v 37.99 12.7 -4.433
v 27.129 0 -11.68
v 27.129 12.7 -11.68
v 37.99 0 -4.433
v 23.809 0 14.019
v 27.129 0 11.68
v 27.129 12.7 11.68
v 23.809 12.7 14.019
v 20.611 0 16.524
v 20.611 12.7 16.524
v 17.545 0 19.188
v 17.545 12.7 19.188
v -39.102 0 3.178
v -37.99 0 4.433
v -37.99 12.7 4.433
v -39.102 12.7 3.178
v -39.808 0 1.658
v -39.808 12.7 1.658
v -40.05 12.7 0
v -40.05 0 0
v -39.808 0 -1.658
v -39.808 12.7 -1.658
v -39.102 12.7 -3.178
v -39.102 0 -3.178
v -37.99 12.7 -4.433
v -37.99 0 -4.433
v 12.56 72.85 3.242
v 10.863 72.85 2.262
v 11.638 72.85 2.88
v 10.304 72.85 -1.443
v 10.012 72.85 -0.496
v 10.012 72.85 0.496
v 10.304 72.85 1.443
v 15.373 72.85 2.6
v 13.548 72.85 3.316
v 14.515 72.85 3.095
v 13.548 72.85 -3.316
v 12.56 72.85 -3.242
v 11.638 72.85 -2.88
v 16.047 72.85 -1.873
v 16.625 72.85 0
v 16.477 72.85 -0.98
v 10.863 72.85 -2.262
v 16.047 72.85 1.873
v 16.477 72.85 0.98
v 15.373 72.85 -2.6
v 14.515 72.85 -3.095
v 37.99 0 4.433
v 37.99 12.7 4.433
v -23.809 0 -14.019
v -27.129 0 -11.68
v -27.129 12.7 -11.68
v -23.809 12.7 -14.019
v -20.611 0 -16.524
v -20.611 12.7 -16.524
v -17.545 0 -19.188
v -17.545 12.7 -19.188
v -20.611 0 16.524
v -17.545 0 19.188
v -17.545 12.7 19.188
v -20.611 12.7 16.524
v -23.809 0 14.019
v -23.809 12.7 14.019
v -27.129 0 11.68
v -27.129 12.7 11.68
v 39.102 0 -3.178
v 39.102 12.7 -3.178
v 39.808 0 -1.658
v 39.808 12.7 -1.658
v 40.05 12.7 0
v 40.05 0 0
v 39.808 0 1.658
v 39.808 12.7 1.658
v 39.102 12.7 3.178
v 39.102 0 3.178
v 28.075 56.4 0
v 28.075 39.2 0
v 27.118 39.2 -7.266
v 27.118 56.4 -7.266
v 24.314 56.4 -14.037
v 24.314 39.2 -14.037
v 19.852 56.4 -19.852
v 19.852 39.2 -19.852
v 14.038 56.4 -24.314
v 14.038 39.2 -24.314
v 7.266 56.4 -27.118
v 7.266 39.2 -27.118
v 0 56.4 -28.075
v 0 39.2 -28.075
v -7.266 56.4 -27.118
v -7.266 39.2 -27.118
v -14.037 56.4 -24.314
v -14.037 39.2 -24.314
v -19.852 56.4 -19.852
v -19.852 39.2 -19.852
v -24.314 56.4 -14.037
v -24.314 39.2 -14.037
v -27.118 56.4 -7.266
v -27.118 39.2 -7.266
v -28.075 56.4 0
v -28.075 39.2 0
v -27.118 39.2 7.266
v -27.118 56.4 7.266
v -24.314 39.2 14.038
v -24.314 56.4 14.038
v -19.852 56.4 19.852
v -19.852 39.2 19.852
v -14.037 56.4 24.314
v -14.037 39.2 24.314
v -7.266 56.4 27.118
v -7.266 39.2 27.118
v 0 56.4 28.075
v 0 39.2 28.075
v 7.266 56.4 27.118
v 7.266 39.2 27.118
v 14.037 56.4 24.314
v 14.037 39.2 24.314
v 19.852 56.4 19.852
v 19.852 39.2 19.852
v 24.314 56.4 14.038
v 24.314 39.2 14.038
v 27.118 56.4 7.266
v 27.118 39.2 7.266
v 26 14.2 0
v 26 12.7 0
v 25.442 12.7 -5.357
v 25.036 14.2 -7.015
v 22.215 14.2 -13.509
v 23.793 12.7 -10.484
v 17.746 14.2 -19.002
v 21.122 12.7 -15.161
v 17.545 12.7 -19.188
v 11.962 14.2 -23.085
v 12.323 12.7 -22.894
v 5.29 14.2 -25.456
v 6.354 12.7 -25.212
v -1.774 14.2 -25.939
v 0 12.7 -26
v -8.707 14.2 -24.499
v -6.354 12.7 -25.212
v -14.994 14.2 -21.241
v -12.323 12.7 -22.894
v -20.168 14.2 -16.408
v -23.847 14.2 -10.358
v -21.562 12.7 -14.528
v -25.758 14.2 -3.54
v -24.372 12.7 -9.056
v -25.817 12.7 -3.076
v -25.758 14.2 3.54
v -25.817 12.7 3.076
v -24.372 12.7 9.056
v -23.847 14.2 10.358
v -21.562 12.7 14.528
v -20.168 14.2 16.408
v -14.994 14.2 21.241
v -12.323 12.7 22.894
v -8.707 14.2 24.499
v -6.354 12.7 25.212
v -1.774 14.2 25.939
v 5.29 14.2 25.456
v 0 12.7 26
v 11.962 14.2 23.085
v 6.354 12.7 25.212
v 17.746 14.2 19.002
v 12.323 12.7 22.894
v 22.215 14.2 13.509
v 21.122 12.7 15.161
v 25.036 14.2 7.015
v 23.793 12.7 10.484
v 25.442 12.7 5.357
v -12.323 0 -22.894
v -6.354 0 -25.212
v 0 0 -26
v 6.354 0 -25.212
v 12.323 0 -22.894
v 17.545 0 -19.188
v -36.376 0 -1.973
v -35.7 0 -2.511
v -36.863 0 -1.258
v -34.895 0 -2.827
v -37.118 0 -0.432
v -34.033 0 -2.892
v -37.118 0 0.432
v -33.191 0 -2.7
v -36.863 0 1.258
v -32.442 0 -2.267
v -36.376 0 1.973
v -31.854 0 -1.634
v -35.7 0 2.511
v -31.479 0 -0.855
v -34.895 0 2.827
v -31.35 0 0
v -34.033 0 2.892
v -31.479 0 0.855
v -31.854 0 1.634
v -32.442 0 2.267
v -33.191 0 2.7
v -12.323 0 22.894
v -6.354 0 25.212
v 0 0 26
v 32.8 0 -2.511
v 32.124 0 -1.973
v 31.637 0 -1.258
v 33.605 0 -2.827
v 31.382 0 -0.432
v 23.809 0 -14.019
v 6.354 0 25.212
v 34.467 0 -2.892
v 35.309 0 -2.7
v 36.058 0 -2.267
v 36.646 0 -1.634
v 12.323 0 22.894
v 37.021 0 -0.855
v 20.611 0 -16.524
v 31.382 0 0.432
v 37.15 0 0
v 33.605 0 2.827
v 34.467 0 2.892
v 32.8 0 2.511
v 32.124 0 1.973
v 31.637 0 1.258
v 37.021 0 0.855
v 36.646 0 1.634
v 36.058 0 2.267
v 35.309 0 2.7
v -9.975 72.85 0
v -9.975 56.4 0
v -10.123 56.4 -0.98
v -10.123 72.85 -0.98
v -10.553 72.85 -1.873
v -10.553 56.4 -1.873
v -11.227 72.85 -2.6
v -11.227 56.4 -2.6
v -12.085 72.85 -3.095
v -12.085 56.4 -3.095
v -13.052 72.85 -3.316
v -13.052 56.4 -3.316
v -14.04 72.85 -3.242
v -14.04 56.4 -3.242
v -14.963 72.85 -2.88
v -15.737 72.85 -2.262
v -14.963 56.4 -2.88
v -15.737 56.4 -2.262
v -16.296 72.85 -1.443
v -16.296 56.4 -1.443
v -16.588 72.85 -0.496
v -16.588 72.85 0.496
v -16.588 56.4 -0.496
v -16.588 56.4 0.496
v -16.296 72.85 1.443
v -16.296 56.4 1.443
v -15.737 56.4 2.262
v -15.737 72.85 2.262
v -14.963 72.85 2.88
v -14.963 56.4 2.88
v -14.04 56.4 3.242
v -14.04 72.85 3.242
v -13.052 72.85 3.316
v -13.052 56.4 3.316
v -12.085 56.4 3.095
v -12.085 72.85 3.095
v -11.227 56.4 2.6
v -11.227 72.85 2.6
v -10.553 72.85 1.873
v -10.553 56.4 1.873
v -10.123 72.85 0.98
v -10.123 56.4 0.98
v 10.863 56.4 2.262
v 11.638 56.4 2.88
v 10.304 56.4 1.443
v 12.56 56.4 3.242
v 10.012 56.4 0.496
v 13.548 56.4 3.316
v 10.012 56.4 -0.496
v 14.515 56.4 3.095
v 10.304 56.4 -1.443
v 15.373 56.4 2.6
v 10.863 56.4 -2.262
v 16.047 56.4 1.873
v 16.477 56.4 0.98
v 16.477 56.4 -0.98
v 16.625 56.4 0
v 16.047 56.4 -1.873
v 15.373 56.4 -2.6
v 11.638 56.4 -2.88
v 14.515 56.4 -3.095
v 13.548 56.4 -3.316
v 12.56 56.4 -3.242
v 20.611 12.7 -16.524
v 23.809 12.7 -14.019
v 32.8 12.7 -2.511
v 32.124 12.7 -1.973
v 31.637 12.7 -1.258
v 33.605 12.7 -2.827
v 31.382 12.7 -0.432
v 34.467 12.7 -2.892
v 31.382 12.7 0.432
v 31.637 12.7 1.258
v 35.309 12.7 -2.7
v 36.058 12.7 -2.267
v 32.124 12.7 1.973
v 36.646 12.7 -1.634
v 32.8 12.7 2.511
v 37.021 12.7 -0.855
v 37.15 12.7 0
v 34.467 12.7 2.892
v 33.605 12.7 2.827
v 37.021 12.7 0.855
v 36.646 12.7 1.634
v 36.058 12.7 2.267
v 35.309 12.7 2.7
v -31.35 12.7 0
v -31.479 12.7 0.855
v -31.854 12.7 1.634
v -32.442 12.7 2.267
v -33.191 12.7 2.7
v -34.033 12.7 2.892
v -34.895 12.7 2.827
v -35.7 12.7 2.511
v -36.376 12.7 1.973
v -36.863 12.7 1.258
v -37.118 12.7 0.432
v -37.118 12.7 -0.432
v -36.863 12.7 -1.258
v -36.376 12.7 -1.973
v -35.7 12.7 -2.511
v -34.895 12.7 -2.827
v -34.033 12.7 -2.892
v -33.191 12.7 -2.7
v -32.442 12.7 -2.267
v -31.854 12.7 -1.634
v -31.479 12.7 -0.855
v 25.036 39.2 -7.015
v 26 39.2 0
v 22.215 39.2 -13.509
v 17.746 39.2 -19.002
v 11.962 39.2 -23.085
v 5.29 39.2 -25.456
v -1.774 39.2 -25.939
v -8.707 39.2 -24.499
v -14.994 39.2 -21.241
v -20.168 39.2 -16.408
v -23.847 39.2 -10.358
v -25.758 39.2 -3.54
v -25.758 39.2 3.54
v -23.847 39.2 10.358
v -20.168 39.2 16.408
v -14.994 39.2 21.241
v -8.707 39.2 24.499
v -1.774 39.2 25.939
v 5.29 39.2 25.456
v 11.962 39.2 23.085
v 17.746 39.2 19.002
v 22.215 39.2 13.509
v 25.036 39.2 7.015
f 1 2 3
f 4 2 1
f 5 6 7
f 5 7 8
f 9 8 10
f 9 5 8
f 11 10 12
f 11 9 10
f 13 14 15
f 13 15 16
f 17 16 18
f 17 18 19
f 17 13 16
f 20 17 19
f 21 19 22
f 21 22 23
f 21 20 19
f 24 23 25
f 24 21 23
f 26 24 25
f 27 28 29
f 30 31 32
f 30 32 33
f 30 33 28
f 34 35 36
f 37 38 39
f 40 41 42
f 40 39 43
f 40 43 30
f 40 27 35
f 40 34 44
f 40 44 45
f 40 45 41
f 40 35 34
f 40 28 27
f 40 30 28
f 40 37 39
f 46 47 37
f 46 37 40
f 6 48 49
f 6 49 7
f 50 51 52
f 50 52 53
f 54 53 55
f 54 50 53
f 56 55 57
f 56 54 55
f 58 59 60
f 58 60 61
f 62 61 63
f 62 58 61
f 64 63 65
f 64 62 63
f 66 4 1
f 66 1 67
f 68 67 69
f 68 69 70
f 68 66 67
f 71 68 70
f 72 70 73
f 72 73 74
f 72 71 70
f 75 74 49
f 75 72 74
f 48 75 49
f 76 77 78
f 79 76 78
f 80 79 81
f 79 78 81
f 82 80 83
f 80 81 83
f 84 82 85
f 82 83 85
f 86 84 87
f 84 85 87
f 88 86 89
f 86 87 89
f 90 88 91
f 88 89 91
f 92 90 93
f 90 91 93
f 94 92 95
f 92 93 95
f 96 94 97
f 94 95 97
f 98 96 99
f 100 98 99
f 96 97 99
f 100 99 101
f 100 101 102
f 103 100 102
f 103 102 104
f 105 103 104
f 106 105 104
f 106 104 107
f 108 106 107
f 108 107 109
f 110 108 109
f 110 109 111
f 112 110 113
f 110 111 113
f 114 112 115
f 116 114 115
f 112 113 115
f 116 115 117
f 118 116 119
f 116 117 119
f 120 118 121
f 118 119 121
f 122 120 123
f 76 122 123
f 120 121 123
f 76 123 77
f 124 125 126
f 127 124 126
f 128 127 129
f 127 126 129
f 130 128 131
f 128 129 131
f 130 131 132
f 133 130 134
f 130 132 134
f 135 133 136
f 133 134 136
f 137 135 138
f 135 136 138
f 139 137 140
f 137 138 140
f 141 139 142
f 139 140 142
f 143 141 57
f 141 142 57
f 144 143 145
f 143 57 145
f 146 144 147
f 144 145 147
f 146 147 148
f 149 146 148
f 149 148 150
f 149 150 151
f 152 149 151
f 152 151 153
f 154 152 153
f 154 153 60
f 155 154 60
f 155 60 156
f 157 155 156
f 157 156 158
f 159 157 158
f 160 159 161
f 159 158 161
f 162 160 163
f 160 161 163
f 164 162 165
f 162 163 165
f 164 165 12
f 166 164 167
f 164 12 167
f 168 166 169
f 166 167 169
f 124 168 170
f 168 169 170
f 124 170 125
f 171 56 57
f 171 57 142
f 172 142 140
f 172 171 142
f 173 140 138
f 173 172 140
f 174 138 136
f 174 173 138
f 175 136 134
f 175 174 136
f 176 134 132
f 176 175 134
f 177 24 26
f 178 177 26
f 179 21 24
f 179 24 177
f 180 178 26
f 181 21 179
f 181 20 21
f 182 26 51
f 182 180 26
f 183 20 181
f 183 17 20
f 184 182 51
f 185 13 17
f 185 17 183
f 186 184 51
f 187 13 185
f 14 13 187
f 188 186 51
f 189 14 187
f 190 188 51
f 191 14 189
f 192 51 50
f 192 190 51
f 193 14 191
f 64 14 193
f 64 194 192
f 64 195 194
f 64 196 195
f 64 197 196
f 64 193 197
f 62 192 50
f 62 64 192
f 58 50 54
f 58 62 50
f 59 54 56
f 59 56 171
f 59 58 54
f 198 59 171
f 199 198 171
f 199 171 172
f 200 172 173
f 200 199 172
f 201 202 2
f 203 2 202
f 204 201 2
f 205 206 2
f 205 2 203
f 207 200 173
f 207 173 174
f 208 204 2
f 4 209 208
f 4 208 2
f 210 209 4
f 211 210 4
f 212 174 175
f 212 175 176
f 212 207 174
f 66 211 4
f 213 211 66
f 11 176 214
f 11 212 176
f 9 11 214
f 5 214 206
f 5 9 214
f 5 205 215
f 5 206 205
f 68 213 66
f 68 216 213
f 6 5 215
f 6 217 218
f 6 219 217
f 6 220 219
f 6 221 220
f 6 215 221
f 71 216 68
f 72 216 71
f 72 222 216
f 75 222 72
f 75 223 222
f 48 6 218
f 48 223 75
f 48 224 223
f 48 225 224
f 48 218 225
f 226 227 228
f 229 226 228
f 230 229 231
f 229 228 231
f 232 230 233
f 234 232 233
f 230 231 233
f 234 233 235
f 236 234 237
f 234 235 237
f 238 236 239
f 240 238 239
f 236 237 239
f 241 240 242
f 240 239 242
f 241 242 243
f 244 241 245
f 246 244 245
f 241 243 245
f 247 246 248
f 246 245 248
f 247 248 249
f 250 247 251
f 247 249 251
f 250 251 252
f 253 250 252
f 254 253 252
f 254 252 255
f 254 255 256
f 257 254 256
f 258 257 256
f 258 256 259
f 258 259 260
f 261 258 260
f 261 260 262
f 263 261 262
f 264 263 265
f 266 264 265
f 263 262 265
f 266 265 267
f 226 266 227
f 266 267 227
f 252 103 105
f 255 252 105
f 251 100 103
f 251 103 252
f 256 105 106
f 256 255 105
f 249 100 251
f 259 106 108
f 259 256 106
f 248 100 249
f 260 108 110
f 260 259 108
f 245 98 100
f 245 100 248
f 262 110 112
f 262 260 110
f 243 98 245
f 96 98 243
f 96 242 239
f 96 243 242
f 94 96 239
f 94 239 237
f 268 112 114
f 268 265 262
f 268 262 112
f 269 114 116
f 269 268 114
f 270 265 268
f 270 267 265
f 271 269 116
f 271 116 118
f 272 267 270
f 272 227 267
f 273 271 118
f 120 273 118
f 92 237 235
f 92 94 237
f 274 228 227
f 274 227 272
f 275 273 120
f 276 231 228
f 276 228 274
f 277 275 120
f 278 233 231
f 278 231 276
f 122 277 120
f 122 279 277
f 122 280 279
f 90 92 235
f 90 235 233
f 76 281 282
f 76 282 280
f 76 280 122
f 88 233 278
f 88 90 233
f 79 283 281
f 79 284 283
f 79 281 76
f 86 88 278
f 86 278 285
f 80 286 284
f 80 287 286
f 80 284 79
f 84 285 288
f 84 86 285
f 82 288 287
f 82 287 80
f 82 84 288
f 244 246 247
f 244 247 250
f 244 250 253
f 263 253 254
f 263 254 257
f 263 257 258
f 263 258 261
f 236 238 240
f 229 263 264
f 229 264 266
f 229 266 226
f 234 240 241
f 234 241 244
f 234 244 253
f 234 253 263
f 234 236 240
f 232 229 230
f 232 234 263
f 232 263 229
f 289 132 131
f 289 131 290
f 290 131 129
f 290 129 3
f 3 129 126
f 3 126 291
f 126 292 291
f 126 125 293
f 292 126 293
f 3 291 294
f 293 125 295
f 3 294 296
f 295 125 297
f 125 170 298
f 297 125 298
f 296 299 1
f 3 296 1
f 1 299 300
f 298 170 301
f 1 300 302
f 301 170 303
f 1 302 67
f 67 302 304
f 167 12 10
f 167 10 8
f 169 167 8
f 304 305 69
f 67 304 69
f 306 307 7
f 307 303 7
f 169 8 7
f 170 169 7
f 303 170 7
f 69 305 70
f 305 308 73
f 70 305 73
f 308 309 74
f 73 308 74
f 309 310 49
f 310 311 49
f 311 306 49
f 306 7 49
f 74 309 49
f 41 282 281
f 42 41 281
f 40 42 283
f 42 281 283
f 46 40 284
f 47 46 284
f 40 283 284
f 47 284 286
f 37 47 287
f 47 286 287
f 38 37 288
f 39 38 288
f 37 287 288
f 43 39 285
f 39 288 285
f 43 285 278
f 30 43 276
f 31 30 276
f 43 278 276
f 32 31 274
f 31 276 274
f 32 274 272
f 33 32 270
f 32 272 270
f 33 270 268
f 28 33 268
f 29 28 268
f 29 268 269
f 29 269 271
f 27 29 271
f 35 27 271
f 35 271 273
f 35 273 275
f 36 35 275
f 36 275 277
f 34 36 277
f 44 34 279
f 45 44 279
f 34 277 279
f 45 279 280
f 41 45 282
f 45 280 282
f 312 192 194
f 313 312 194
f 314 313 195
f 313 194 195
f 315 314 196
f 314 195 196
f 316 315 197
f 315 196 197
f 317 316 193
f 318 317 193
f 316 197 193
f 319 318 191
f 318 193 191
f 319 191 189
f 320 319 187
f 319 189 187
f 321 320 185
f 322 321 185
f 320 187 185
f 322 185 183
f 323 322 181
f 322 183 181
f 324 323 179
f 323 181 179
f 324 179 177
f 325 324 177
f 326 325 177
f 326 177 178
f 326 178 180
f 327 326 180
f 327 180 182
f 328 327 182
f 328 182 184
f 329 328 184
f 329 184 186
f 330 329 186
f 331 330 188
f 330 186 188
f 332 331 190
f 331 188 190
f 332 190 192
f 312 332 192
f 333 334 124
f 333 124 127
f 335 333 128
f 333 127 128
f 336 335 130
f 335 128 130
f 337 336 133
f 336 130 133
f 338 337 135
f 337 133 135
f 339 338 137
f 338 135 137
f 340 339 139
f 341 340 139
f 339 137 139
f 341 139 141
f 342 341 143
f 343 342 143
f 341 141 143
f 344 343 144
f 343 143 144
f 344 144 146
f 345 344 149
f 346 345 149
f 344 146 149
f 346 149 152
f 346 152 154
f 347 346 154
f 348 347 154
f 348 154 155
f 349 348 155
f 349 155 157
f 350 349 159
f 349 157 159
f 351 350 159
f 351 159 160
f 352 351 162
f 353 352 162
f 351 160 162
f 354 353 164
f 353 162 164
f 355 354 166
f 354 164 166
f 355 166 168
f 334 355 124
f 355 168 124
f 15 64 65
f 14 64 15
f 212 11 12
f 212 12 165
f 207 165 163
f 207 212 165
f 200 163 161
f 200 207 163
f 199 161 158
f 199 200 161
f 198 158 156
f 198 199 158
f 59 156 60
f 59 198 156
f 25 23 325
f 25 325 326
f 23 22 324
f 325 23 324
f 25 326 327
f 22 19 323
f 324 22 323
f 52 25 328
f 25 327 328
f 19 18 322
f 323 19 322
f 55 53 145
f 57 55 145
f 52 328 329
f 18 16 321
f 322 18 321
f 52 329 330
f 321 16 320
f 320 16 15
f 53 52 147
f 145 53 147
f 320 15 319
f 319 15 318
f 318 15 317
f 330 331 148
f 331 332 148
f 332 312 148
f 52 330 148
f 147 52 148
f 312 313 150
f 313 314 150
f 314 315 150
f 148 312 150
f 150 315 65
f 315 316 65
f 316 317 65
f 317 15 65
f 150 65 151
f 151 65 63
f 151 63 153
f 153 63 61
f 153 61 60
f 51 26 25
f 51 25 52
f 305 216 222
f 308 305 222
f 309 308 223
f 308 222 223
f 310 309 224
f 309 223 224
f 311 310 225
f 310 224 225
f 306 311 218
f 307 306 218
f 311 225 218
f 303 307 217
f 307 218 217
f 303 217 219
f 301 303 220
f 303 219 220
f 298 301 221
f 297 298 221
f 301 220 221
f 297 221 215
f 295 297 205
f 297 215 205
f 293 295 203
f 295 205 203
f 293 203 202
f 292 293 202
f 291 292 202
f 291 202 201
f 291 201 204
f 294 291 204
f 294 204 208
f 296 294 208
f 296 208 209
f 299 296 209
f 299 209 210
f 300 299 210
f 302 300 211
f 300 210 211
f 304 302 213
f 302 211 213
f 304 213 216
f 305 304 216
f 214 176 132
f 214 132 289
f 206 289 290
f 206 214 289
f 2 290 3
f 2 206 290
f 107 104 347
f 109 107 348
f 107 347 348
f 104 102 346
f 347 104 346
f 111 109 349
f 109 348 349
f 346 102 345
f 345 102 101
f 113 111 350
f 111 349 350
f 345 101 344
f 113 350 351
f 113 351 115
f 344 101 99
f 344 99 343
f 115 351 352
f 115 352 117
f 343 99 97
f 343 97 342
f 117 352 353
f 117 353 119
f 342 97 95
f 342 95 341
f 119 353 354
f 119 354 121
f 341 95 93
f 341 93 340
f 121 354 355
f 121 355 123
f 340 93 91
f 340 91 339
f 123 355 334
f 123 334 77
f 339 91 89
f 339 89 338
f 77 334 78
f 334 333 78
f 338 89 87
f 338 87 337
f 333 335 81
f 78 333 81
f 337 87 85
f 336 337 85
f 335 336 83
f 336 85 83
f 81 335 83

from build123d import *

# Parameters (mm, degrees)
SKETCH1_R           = 26
BOSS_EXTRUDE1_DEPTH = 14.2
SKETCH4_R           = 2.9
BOSS_EXTRUDE2_DEPTH = 12.7
SKETCH8_R           = 26
BOSS_EXTRUDE3_DEPTH = 25
SKETCH9_R           = 28.075
BOSS_EXTRUDE4_DEPTH = 17.2
SKETCH10_R          = 3.325
BOSS_EXTRUDE5_DEPTH = 16.45


with BuildPart() as part:
    # Sketch1 → Boss-Extrude1 (new body)
    with BuildSketch(Plane(origin=(0, 0, 0), x_dir=(1, 0, 0), z_dir=(0, 1, 0))):
        Circle(SKETCH1_R)
    extrude(amount=BOSS_EXTRUDE1_DEPTH)

    # Sketch4 → Boss-Extrude2 (add)
    with BuildSketch(Plane.XZ):
        with BuildLine():
            Line((27.12908409, -11.679561866), (37.990088974, -4.433027686))
            ThreePointArc((37.990088974, -4.433027686), (40.05, 0), (37.990088974, 4.433027686))
            Line((37.990088974, 4.433027686), (27.12908409, 11.679561866))
            ThreePointArc((27.12908409, 11.679561866), (22.194049101, 15.251075575), (17.545087541, 19.18775399))
            ThreePointArc((17.545087541, 19.18775399), (0, 26), (-17.545087541, 19.18775399))
            ThreePointArc((-17.545087541, 19.18775399), (-22.194049101, 15.251075575), (-27.12908409, 11.679561866))
            Line((-27.12908409, 11.679561866), (-37.990088974, 4.433027686))
            ThreePointArc((-37.990088974, 4.433027686), (-40.05, 0), (-37.990088974, -4.433027686))
            Line((-37.990088974, -4.433027686), (-27.12908409, -11.679561866))
            ThreePointArc((-27.12908409, -11.679561866), (-22.194049101, -15.251075575), (-17.545087541, -19.18775399))
            ThreePointArc((-17.545087541, -19.18775399), (0, -26), (17.545087541, -19.18775399))
            ThreePointArc((17.545087541, -19.18775399), (22.194049101, -15.251075575), (27.12908409, -11.679561866))
        make_face()
        with Locations((34.25, 0)):
            Circle(SKETCH4_R, mode=Mode.SUBTRACT)
        with Locations((-34.25, 0)):
            Circle(SKETCH4_R, mode=Mode.SUBTRACT)
    extrude(amount=-BOSS_EXTRUDE2_DEPTH)

    # Sketch8 → Boss-Extrude3 (add)
    with BuildSketch(Plane(origin=(0, 14.2, 0), x_dir=(1, 0, 0), z_dir=(0, 1, 0))):
        Circle(SKETCH8_R)
    extrude(amount=BOSS_EXTRUDE3_DEPTH)

    # Sketch9 → Boss-Extrude4 (add)
    with BuildSketch(Plane(origin=(0, 39.2, 0), x_dir=(1, 0, 0), z_dir=(0, 1, 0))):
        Circle(SKETCH9_R)
    extrude(amount=BOSS_EXTRUDE4_DEPTH)

    # Sketch10 → Boss-Extrude5 (add)
    with BuildSketch(Plane(origin=(0, 56.4, 0), x_dir=(1, 0, 0), z_dir=(0, 1, 0))):
        with Locations((13.3, 0)):
            Circle(SKETCH10_R)
        with Locations((-13.3, 0)):
            Circle(SKETCH10_R)
    extrude(amount=BOSS_EXTRUDE5_DEPTH)


solid = part.part
